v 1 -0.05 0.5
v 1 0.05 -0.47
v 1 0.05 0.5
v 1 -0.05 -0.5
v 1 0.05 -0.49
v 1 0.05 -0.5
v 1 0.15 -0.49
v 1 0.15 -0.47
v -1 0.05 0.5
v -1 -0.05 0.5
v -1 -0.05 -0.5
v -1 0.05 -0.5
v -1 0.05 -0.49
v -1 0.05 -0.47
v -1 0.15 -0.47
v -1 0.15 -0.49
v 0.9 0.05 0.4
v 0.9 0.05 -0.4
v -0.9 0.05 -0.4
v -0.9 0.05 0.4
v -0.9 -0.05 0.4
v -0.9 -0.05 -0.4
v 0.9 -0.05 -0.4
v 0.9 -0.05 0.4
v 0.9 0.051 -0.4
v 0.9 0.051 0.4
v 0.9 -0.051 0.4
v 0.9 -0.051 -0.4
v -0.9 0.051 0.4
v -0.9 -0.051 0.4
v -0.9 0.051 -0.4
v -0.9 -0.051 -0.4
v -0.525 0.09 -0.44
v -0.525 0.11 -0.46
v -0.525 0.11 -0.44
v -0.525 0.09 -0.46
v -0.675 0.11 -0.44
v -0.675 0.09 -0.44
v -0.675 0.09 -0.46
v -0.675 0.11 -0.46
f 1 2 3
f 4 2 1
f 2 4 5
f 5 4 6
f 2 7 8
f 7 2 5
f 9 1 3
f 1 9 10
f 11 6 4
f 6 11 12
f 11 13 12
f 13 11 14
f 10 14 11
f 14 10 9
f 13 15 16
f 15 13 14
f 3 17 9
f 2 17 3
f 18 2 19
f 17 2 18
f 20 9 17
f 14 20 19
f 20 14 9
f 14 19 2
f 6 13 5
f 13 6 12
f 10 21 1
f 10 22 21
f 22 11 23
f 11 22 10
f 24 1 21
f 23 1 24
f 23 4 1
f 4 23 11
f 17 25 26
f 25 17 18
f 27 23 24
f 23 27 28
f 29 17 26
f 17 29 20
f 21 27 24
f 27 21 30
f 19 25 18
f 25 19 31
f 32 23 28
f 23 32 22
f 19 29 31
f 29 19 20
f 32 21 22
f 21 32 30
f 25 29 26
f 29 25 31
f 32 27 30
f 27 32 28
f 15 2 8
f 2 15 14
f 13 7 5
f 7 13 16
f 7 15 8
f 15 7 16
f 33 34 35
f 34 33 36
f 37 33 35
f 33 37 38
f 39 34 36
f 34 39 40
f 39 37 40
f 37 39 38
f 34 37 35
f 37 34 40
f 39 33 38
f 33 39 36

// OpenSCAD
module Chalkboard_01(){
    union(){

    color("#c87d3a")
    cube([2,0.1,1],center =true);

    color("#424e63")
    cube([1.8,0.102,0.8],center =true);


    translate([0,0.1,-0.48])
    color("#8b8f2b")
    cube([2,0.1,0.02],center =true);

    translate([-0.6,0.1,-0.45])
    color("white")
    cube([0.15,0.02,0.02],center =true);
    }

}

Chalkboard_01();

// Written by Nicolì Angelo (Gengio) 2024: 
// MIT License

//Permission is hereby granted, free of charge, to any person obtaining a copy of this software and associated documentation files (the "Software"), to deal in the Software without restriction, including without limitation the rights to use, copy, modify, merge, publish, distribute, sublicense, and/or sell copies of the Software, and to permit persons to whom the Software is furnished to do so, subject to the following conditions:

//The above copyright notice and this permission notice shall be included in all copies or substantial portions of the Software.

//THE SOFTWARE IS PROVIDED "AS IS", WITHOUT WARRANTY OF ANY KIND, EXPRESS OR IMPLIED, INCLUDING BUT NOT LIMITED TO THE WARRANTIES OF MERCHANTABILITY, FITNESS FOR A PARTICULAR PURPOSE AND NONINFRINGEMENT. IN NO EVENT SHALL THE AUTHORS OR COPYRIGHT HOLDERS BE LIABLE FOR ANY CLAIM, DAMAGES OR OTHER LIABILITY, WHETHER IN AN ACTION OF CONTRACT, TORT OR OTHERWISE, ARISING FROM, OUT OF OR IN CONNECTION WITH THE SOFTWARE OR THE USE OR OTHER DEALINGS IN THE SOFTWARE.
